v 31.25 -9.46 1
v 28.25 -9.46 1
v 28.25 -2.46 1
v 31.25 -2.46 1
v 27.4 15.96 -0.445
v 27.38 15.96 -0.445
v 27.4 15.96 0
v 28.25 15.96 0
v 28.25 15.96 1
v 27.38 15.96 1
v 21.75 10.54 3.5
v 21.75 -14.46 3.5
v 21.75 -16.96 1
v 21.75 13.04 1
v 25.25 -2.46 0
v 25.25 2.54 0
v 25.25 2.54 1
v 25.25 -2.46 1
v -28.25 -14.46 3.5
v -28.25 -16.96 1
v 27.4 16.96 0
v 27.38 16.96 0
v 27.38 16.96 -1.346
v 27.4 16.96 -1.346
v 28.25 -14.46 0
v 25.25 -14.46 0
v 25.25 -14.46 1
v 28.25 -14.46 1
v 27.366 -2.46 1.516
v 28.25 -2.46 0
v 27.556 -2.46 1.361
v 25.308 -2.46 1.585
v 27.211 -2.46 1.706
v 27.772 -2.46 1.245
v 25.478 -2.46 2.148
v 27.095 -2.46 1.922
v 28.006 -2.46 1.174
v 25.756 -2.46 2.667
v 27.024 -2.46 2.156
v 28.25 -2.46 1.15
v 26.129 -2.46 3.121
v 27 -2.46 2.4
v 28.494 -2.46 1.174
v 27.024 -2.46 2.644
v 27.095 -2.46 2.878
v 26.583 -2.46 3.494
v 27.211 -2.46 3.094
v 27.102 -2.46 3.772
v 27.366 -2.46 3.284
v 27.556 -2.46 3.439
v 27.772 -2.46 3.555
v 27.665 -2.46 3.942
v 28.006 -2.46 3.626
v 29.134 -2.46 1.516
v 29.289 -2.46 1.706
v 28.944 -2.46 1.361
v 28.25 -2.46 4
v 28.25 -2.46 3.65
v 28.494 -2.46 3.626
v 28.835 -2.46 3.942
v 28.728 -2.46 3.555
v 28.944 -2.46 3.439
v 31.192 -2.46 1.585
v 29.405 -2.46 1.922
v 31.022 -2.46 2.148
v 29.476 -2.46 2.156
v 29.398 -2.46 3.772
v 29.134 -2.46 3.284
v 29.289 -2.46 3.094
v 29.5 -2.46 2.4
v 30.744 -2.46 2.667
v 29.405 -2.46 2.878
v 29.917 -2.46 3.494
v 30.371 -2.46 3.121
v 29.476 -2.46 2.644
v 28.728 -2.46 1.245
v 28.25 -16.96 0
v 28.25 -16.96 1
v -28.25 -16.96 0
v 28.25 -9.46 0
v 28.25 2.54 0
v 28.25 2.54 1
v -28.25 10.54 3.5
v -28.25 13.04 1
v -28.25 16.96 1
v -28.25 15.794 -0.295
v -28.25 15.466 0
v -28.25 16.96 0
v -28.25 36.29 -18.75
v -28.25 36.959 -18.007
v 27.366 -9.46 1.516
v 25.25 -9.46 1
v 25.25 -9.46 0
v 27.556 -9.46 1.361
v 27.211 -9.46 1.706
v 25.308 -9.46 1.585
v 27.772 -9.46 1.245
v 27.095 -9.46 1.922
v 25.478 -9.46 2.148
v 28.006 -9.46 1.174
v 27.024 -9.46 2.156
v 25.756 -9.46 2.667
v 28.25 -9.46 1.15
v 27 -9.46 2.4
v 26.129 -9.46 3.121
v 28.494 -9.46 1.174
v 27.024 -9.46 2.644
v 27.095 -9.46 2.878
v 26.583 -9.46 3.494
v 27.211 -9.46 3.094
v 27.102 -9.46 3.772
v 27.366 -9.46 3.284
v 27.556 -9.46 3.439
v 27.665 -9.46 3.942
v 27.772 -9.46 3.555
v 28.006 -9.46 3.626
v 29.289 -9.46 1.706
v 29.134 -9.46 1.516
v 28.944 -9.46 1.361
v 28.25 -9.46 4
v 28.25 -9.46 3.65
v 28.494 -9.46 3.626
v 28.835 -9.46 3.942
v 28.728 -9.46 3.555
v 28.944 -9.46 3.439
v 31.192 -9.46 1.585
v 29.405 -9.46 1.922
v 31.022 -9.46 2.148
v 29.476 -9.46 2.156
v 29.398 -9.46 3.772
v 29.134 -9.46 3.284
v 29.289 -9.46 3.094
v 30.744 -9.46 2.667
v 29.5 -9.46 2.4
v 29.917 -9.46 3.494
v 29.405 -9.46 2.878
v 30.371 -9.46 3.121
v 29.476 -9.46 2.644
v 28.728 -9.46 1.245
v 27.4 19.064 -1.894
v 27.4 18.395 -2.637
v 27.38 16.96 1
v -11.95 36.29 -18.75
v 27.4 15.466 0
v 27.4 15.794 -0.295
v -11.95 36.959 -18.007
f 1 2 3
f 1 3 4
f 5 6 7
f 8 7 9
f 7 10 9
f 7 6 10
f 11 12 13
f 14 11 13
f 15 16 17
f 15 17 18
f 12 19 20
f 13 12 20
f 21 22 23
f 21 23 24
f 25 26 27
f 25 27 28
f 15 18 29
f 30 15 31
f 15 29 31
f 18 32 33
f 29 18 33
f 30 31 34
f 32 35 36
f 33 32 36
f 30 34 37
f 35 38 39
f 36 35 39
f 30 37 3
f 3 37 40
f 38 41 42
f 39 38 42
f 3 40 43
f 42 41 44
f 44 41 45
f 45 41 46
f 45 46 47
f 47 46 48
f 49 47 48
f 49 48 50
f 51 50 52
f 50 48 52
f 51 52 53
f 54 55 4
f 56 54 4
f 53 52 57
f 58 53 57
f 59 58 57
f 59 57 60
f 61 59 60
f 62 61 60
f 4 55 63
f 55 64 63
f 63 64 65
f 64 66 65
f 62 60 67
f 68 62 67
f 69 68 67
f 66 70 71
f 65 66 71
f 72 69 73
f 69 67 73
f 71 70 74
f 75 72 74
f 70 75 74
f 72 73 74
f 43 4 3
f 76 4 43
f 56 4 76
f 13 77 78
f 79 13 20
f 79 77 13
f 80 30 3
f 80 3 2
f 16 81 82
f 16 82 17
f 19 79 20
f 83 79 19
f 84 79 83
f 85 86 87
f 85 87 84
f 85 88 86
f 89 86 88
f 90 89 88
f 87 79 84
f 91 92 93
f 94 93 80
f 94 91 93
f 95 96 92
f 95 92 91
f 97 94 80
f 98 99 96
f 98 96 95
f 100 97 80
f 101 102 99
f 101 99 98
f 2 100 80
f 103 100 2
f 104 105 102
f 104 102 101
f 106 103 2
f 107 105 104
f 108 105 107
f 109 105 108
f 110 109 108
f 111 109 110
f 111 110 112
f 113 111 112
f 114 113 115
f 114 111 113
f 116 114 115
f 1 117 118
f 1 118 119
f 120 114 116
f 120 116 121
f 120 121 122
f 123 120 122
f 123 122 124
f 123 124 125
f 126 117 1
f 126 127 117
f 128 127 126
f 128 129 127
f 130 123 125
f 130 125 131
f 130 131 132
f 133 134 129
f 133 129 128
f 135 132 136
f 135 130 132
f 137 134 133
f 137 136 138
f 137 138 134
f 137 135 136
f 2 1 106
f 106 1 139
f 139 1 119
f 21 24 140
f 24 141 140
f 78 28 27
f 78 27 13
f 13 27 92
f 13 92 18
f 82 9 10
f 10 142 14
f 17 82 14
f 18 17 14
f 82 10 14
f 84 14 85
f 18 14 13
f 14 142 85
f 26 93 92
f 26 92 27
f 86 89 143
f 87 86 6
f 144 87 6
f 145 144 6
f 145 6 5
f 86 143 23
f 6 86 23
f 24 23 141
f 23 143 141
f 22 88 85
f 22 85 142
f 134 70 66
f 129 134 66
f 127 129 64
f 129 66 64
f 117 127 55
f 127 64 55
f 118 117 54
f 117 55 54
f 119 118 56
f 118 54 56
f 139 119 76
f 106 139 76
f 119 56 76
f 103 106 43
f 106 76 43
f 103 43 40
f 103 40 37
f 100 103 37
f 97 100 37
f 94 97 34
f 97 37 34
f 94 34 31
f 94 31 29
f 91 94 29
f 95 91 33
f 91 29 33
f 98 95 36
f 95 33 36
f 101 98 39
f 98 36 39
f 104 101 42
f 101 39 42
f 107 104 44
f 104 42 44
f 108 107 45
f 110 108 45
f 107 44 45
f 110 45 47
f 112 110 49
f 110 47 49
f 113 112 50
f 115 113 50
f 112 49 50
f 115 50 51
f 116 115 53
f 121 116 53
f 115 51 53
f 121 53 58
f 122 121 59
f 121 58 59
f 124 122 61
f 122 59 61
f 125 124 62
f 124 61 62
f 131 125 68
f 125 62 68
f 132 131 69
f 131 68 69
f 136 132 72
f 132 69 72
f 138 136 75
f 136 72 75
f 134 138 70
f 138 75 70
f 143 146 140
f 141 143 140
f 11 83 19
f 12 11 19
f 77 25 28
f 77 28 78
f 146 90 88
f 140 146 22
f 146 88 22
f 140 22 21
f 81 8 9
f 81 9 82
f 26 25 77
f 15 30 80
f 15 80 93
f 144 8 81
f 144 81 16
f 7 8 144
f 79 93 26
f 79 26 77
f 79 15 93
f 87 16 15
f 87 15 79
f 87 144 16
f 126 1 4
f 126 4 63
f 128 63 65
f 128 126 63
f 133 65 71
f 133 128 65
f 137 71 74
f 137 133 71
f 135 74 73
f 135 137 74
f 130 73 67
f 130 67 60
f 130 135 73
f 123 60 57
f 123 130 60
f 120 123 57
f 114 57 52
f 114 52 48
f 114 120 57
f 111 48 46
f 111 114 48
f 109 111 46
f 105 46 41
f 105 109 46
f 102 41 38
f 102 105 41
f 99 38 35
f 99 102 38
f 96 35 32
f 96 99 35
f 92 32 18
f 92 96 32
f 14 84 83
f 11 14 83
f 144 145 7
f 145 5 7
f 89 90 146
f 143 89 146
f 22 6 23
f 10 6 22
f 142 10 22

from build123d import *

# Parameters (mm, degrees)
BOSS_EXTRUDE1_DEPTH = 1
BOSS_EXTRUDE2_DEPTH = 7
SKETCH3_R           = 1.25
CUT_EXTRUDE1_DEPTH  = 7
BOSS_EXTRUDE3_DEPTH = 50
BOSS_EXTRUDE4_DEPTH = 1
SKETCH6_W           = 55.65
SKETCH6_H           = 1
BOSS_EXTRUDE5_DEPTH = 0.441482
CUT_EXTRUDE2_REACH  = 21.75
SKETCH7_W           = 0.87
SKETCH7_H           = 1


with BuildPart() as part:
    # Sketch1 → Boss-Extrude1 (new body)
    with BuildSketch(Plane.XY):
        Polygon((-28.25, -16.96), (-28.25, 16.96), (28.25, 16.96), (28.25, 2.54), (25.25, 2.54), (25.25, -2.46), (28.25, -2.46), (28.25, -9.46), (25.25, -9.46), (25.25, -14.46), (28.25, -14.46), (28.25, -16.96), align=None)
    extrude(amount=BOSS_EXTRUDE1_DEPTH)

    # Sketch2 → Boss-Extrude2 (add)
    with BuildSketch(Plane.XZ.offset(9.46)):
        with BuildLine():
            Line((28.25, 1), (31.25, 1))
            ThreePointArc((31.25, 1), (28.25, 4), (25.25, 1))
            Line((25.25, 1), (28.25, 1))
        make_face()
    extrude(amount=-BOSS_EXTRUDE2_DEPTH)

    # Sketch3 → Cut-Extrude1 (cut)
    with BuildSketch(Plane(origin=(0, -2.46, 0), x_dir=(1, 0, 0), z_dir=(0, 1, 0))):
        with Locations((28.25, -2.4)):
            Circle(SKETCH3_R)
    extrude(amount=-CUT_EXTRUDE1_DEPTH, mode=Mode.SUBTRACT)

    # Sketch4 → Boss-Extrude3 (add)
    with BuildSketch(Plane.ZY.offset(28.25)):
        Polygon((1, 13.04), (3.5, 10.54), (3.5, -14.46), (1, -16.96), align=None)
    extrude(amount=-BOSS_EXTRUDE3_DEPTH)



with BuildPart() as body_2:
    # Sketch5 → Boss-Extrude4 (new body)
    with BuildSketch(Plane(origin=(0, 7.593598631, 8.433545673), x_dir=(-1, 0, 0), z_dir=(0, 0.669130606, 0.743144825))):
        Polygon((28.25, -11.934605634), (28.25, -39.514605634), (11.95, -39.514605634), (-27.4, -15.434605634), (-27.4, -11.934605634), align=None)
    extrude(amount=-BOSS_EXTRUDE4_DEPTH)


with BuildPart() as part_1:
    add(part.part)

    add(body_2.part)  # Boss-Extrude5 merges body 2
    # Sketch6 → Boss-Extrude5 (add)
    with BuildSketch(Plane(origin=(0, 8.869140421, -7.985809904), x_dir=(1, 0, 0), z_dir=(0, -0.743144825, 0.669130606))):
        with Locations((-0.425, 10.848455084)):
            Rectangle(SKETCH6_W, SKETCH6_H)
    extrude(amount=BOSS_EXTRUDE5_DEPTH)

    # Cut-Extrude2: up to this face of the body (flat: up to its plane)
    cut_extrude2_end = Plane(part_1.part.faces().sort_by_distance((-6.843835743, 23.936811471, -7.627581995))[0])
    # Sketch7 → Cut-Extrude2 (cut, up to the picked face)
    with BuildSketch(Plane.XY.offset(1), mode=Mode.PRIVATE) as cut_extrude2_sk1:
        with Locations((27.815, 16.46)):
            Rectangle(SKETCH7_W, SKETCH7_H)
    cut_extrude2_tool1 = split(extrude(cut_extrude2_sk1.sketch, amount=-CUT_EXTRUDE2_REACH, mode=Mode.PRIVATE), bisect_by=cut_extrude2_end, keep=Keep.BOTH, mode=Mode.PRIVATE)
    add(cut_extrude2_tool1.solids().sort_by_distance((27.815, 16.46, 1))[0], mode=Mode.SUBTRACT)


solid = part_1.part
